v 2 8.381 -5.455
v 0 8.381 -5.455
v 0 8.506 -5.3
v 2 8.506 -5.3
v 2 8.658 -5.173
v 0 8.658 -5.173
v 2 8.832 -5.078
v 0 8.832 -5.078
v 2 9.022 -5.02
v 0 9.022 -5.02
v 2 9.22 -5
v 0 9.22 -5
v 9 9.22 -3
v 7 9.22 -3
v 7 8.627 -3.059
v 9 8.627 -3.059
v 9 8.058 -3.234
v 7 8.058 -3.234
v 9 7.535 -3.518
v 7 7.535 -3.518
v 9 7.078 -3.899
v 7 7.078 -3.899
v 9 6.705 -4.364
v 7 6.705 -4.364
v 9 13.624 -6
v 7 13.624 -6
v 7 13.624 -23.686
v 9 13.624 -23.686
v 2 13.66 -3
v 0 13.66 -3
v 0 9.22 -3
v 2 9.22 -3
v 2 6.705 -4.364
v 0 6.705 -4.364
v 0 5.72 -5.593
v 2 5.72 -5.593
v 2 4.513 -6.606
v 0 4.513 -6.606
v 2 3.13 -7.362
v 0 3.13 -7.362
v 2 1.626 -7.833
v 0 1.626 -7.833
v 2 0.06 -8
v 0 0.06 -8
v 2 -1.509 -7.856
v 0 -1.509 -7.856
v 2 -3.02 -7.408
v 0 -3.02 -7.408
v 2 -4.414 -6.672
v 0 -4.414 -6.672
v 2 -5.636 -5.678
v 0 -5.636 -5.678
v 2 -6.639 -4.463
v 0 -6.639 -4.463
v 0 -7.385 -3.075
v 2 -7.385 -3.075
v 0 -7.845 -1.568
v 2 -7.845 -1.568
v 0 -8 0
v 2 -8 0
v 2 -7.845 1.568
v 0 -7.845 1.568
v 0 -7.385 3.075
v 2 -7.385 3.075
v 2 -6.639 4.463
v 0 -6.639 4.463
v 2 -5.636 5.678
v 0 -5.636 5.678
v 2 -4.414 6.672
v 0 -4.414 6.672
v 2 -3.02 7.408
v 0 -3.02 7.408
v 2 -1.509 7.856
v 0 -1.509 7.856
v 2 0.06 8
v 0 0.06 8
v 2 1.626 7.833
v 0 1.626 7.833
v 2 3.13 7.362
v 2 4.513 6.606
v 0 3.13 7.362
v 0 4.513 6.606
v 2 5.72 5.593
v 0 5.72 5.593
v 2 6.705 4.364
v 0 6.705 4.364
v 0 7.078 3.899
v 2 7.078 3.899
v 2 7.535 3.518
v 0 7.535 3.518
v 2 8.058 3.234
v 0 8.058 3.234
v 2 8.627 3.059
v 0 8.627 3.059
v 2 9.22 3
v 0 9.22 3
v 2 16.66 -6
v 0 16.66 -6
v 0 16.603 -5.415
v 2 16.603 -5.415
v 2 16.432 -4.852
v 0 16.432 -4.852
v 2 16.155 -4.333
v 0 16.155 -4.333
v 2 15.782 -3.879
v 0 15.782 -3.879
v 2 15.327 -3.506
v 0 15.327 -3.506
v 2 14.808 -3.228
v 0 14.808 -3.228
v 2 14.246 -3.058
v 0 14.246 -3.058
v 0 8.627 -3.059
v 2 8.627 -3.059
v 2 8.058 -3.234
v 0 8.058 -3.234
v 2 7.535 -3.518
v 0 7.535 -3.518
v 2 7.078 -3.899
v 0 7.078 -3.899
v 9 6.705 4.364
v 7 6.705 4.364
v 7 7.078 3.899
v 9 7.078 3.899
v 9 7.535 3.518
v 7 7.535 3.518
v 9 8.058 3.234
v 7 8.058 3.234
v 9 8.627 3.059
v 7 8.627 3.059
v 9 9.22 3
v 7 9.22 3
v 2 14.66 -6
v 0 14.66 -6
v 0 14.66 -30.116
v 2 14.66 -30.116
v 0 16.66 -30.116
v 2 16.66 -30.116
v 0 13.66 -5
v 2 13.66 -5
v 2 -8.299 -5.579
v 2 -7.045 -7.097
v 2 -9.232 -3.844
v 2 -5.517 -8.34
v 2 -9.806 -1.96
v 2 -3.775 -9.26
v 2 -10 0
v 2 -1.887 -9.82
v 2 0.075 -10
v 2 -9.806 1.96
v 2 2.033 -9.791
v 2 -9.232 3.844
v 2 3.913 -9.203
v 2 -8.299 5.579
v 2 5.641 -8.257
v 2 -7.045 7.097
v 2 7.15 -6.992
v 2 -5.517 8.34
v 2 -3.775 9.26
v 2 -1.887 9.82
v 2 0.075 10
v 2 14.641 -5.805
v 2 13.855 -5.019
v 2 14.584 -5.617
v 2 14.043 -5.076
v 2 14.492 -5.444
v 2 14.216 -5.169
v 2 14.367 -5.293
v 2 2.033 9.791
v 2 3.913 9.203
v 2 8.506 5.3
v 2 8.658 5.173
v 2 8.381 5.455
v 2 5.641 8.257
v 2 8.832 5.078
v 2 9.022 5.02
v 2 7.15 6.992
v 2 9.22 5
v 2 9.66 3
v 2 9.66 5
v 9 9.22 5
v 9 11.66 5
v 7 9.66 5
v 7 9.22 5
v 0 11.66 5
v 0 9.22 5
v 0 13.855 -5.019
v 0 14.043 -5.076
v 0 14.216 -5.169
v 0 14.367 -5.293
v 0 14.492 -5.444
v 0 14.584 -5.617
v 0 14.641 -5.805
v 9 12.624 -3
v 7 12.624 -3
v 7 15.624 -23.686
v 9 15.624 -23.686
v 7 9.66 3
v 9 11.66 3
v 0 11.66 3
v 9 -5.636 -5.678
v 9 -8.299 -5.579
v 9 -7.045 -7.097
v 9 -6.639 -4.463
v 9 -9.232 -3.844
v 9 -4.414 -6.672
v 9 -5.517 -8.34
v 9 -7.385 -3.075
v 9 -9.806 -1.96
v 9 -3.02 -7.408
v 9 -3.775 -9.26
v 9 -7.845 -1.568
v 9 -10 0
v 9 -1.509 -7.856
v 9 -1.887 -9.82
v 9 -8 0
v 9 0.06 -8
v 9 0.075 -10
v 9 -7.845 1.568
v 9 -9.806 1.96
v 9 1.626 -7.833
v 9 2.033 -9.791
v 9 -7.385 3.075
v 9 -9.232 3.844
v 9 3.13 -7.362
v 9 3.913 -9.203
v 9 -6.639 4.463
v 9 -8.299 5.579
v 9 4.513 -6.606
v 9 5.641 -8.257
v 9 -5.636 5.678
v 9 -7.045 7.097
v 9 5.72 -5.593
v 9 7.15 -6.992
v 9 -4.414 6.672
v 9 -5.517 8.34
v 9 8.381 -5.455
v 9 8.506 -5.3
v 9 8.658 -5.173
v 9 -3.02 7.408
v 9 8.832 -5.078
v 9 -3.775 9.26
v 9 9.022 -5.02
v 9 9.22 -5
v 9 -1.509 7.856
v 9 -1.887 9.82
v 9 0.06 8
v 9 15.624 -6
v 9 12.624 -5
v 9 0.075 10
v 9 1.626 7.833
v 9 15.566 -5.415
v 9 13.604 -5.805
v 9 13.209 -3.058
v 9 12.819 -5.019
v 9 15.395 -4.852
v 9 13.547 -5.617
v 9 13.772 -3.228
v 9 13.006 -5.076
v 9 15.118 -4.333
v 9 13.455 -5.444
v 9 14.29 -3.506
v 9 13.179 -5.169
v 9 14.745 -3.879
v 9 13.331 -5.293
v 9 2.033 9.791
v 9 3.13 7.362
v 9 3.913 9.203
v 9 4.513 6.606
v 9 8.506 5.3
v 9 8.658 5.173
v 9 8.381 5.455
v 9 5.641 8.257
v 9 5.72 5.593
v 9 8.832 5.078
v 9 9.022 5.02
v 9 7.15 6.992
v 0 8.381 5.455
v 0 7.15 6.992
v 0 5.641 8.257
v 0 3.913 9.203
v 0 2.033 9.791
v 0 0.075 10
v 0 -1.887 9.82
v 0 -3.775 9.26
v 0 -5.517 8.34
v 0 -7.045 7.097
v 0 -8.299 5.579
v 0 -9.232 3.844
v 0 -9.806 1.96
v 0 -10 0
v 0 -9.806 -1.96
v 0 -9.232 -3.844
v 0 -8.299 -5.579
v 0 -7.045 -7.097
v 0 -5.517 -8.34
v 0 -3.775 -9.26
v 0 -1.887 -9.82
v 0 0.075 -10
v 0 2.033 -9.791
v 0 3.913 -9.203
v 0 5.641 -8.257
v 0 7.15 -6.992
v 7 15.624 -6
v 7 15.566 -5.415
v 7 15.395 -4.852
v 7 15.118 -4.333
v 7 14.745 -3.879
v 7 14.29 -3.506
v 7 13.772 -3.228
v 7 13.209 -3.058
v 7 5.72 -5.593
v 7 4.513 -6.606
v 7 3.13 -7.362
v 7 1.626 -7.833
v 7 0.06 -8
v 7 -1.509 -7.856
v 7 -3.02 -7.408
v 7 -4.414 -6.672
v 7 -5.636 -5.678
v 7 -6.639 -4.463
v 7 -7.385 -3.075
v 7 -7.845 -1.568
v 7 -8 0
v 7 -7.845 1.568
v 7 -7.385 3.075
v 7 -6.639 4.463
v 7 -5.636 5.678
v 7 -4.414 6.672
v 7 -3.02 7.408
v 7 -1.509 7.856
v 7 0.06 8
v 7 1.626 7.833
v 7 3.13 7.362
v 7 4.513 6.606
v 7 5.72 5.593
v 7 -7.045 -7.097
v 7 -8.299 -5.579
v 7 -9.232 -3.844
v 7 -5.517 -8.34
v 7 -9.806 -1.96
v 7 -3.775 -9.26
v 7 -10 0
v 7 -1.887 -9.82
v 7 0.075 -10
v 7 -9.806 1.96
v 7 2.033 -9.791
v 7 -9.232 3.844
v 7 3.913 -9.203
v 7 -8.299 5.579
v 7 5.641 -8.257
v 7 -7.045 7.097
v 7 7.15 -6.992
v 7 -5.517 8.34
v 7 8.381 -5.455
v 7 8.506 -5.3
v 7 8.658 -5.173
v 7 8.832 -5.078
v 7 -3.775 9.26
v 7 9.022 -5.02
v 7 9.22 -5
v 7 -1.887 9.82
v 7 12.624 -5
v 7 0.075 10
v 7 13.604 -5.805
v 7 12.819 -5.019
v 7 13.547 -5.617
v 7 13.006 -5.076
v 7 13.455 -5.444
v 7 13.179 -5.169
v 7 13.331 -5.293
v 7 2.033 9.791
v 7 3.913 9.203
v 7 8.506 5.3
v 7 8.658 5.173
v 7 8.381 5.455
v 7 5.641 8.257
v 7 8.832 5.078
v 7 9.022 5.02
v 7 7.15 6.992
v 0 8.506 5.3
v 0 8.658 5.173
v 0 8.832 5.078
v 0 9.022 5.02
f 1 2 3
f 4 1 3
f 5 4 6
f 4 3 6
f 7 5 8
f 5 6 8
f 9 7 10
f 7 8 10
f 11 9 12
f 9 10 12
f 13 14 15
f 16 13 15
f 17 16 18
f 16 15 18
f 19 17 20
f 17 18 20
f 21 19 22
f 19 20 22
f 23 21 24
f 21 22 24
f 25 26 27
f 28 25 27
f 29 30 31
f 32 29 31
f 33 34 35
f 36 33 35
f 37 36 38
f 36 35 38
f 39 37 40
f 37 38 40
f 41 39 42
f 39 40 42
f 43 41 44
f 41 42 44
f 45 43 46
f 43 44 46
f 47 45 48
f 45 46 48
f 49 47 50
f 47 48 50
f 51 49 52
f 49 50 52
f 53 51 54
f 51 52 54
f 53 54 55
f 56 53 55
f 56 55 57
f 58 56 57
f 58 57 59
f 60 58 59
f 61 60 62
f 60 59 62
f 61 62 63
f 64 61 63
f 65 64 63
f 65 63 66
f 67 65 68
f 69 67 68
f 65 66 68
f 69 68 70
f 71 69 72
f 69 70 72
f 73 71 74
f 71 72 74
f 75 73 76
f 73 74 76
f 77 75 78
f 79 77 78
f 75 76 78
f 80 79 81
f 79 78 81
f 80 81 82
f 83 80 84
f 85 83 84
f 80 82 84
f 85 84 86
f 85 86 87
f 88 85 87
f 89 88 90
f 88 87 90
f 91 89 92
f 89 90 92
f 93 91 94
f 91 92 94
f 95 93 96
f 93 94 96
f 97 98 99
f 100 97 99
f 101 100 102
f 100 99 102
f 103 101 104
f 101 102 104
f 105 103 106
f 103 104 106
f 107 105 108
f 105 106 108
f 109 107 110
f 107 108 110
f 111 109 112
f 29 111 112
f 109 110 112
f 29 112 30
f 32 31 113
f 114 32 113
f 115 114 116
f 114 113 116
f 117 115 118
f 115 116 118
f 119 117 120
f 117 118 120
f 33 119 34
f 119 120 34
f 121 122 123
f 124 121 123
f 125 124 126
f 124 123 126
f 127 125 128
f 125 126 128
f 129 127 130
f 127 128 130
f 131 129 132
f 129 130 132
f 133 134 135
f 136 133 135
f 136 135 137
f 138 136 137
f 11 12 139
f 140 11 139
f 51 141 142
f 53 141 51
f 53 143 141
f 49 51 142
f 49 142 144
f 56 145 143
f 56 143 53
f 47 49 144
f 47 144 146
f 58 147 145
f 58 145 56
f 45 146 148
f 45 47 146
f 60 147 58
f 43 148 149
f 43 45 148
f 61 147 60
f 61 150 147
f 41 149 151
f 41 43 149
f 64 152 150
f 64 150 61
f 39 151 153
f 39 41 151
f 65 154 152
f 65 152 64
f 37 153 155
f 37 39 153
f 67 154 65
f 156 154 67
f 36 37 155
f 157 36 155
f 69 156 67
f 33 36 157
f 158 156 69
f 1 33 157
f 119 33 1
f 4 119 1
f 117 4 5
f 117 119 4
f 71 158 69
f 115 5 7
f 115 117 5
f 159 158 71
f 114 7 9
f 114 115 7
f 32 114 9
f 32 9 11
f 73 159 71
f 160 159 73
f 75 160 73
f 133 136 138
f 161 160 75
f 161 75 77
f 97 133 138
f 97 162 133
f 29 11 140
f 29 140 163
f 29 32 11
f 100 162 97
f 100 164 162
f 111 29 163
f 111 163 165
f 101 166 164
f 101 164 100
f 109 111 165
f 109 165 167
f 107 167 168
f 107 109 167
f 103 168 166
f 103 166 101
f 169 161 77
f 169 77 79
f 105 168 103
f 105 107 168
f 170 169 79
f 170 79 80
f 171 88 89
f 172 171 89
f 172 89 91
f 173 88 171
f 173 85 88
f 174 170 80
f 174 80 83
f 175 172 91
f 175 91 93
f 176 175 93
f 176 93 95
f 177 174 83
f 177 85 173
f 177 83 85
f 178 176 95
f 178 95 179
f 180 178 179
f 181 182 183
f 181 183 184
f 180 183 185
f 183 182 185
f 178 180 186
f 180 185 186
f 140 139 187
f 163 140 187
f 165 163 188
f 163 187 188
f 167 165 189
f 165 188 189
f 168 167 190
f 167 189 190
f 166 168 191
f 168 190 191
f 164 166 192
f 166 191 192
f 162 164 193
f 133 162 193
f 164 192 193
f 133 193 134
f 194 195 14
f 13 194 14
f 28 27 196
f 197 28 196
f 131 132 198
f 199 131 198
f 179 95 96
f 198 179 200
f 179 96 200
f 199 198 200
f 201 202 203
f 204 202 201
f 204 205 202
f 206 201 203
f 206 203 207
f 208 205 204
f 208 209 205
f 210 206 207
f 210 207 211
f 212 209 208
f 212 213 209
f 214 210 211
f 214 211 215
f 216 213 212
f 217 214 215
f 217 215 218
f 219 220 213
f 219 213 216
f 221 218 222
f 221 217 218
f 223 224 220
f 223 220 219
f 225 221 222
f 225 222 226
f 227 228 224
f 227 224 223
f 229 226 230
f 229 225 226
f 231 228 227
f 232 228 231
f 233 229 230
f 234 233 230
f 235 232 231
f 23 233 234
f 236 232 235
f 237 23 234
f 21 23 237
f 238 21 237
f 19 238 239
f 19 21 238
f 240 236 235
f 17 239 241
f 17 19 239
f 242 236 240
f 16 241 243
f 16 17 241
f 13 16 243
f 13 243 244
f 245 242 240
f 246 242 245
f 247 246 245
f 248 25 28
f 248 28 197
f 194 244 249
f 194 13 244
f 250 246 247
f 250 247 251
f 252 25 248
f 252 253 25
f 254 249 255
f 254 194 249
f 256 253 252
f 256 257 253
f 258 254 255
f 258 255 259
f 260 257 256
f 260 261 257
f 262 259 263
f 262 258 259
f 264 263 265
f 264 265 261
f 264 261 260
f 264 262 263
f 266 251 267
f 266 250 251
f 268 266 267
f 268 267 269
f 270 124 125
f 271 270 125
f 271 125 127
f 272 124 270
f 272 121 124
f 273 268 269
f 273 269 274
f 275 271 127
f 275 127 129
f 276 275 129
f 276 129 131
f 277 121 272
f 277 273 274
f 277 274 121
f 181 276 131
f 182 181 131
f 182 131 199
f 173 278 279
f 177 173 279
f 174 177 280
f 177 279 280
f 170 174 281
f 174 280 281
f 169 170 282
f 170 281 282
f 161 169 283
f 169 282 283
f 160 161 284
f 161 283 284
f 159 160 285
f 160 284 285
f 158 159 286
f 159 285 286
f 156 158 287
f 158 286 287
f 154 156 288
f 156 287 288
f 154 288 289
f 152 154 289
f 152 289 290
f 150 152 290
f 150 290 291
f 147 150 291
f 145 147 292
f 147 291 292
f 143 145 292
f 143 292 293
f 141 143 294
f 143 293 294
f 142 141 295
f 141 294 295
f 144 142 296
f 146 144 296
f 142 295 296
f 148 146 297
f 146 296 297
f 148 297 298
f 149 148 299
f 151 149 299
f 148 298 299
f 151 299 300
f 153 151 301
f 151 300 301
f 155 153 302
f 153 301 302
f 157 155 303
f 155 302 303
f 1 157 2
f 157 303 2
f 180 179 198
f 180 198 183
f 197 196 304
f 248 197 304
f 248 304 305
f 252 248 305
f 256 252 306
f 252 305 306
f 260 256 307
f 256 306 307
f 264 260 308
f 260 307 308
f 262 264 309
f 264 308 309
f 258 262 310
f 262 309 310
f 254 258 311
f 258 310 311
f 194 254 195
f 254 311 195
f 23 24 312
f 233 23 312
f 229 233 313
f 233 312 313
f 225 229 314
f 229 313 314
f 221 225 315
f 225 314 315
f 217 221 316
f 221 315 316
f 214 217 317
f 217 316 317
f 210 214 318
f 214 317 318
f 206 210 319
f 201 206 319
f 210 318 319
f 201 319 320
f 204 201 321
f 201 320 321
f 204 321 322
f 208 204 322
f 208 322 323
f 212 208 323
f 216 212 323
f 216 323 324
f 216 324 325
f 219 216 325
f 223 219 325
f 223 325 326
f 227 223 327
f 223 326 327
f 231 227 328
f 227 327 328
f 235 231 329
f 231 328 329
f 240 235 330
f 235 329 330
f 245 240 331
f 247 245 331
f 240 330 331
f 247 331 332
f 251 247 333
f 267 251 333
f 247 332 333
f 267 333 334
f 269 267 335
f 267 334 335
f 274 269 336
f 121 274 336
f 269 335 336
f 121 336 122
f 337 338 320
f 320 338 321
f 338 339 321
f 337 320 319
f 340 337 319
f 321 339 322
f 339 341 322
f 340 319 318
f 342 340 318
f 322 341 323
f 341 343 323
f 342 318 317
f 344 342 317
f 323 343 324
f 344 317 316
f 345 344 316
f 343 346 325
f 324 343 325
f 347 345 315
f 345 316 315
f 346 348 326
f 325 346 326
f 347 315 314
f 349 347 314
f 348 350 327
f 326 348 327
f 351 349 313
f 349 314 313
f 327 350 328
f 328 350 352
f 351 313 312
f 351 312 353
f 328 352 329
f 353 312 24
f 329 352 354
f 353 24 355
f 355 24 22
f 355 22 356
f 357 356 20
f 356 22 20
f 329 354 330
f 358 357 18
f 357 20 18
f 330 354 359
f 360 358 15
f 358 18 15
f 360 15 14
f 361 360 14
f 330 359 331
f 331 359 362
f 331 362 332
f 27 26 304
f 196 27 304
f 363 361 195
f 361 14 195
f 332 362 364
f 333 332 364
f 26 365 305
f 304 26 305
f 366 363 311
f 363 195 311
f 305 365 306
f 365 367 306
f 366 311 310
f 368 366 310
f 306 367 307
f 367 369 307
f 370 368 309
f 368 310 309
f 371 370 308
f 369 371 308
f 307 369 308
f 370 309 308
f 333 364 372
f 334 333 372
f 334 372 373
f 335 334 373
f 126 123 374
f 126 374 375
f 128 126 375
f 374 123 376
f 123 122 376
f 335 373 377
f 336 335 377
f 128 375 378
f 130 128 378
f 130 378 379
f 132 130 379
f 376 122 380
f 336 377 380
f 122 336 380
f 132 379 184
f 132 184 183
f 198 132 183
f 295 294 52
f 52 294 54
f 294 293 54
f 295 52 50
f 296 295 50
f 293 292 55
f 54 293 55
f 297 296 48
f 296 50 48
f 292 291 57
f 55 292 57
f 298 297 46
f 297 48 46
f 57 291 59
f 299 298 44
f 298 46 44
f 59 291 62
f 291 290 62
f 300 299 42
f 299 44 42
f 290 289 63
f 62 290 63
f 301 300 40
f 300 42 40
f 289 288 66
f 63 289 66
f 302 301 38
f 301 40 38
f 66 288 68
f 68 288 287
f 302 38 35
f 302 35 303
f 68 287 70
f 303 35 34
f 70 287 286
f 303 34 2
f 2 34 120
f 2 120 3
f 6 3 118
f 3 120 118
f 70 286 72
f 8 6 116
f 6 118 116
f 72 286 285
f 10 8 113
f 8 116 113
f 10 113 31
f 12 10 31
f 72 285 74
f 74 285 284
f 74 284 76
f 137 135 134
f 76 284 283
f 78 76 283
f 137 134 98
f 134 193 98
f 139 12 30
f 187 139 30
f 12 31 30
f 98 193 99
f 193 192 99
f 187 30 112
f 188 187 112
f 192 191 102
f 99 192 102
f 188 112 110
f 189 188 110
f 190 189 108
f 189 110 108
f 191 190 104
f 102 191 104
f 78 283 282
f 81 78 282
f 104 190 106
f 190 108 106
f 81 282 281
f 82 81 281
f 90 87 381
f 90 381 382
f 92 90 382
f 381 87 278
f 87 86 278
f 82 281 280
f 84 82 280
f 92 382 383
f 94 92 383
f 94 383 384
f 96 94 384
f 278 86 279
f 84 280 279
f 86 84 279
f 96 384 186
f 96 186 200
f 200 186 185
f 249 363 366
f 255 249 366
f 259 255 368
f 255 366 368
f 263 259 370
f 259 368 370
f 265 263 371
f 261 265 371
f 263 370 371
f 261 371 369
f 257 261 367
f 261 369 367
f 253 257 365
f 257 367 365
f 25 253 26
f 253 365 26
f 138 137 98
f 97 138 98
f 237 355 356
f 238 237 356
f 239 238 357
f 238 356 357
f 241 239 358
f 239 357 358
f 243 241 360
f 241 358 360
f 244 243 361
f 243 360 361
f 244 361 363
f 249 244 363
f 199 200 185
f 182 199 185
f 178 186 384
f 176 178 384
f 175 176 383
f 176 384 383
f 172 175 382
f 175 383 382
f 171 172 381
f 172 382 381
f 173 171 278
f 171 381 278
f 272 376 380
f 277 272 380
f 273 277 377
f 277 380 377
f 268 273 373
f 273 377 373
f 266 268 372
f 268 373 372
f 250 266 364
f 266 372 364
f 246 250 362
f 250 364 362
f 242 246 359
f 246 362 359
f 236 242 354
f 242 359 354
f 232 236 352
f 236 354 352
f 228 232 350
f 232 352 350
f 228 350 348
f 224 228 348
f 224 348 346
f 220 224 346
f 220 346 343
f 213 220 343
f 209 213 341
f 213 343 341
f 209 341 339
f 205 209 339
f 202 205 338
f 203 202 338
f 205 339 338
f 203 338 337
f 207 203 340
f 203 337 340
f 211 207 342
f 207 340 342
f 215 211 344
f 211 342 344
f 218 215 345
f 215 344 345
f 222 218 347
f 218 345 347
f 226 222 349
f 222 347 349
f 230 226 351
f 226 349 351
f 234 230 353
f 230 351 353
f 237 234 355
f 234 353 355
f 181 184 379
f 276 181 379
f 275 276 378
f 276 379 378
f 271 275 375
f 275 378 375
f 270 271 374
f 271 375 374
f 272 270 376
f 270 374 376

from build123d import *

# Parameters (mm, degrees)
F1_DEPTH = 2
F2_W     = 2
F2_H     = 2
F3_DEPTH = 5
F5_DEPTH = 2


with BuildPart() as f1:
    # F0 (on Right) → F1 (new body)
    with BuildSketch(Plane.YZ):
        with BuildLine():
            ThreePointArc((9.219544, 5), (8.742813, 5.120951), (8.381404, 5.454545))
            ThreePointArc((8.381404, 5.454545), (-10, 0), (8.381404, -5.454545))
            ThreePointArc((8.381404, -5.454545), (8.742813, -5.120951), (9.219544, -5))
            Line((9.219544, -5), (13.660254, -5))
            ThreePointArc((13.660254, -5), (14.367361, -5.292893), (14.660254, -6))
            Line((14.660254, -6), (14.660254, -30.115784))
            Line((14.660254, -30.115784), (16.660254, -30.115784))
            Line((16.660254, -30.115784), (16.660254, -6))
            ThreePointArc((16.660254, -6), (15.781575, -3.878679), (13.660254, -3))
            Line((13.660254, -3), (9.219544, -3))
            ThreePointArc((9.219544, -3), (7.78935, -3.362852), (6.705123, -4.363636))
            ThreePointArc((6.705123, -4.363636), (-8, 0), (6.705123, 4.363636))
            ThreePointArc((6.705123, 4.363636), (7.78935, 3.362852), (9.219544, 3))
            Line((9.219544, 3), (11.660254, 3))
            Line((11.660254, 3), (11.660254, 5))
            Line((11.660254, 5), (9.219544, 5))
        make_face()
    extrude(amount=F1_DEPTH)

    # F2 (on face) → F3 (join)
    with BuildSketch(Plane.YZ.offset(2)):
        with Locations((10.660254, 4)):
            Rectangle(F2_W, F2_H)
    extrude(amount=F3_DEPTH)

    # F4 (on face) → F5 (join)
    with BuildSketch(Plane.YZ.offset(7)):
        with BuildLine():
            ThreePointArc((9.219544, 5), (8.742813, 5.120951), (8.381404, 5.454545))
            ThreePointArc((8.381404, 5.454545), (-10, 0), (8.381404, -5.454545))
            ThreePointArc((8.381404, -5.454545), (8.742813, -5.120951), (9.219544, -5))
            Line((9.219544, -5), (12.623615, -5))
            ThreePointArc((12.623615, -5), (13.330721, -5.292893), (13.623615, -6))
            Line((13.623615, -6), (13.623615, -23.685562))
            Line((13.623615, -23.685562), (15.623615, -23.685562))
            Line((15.623615, -23.685562), (15.623615, -6))
            ThreePointArc((15.623615, -6), (14.744935, -3.878679), (12.623615, -3))
            Line((12.623615, -3), (9.219544, -3))
            ThreePointArc((9.219544, -3), (7.78935, -3.362852), (6.705123, -4.363636))
            ThreePointArc((6.705123, -4.363636), (-8, 0), (6.705123, 4.363636))
            ThreePointArc((6.705123, 4.363636), (7.78935, 3.362852), (9.219544, 3))
            Line((9.219544, 3), (11.660254, 3))
            Line((11.660254, 3), (11.660254, 5))
            Line((11.660254, 5), (9.219544, 5))
        make_face()
    extrude(amount=F5_DEPTH)


solid = f1.part
